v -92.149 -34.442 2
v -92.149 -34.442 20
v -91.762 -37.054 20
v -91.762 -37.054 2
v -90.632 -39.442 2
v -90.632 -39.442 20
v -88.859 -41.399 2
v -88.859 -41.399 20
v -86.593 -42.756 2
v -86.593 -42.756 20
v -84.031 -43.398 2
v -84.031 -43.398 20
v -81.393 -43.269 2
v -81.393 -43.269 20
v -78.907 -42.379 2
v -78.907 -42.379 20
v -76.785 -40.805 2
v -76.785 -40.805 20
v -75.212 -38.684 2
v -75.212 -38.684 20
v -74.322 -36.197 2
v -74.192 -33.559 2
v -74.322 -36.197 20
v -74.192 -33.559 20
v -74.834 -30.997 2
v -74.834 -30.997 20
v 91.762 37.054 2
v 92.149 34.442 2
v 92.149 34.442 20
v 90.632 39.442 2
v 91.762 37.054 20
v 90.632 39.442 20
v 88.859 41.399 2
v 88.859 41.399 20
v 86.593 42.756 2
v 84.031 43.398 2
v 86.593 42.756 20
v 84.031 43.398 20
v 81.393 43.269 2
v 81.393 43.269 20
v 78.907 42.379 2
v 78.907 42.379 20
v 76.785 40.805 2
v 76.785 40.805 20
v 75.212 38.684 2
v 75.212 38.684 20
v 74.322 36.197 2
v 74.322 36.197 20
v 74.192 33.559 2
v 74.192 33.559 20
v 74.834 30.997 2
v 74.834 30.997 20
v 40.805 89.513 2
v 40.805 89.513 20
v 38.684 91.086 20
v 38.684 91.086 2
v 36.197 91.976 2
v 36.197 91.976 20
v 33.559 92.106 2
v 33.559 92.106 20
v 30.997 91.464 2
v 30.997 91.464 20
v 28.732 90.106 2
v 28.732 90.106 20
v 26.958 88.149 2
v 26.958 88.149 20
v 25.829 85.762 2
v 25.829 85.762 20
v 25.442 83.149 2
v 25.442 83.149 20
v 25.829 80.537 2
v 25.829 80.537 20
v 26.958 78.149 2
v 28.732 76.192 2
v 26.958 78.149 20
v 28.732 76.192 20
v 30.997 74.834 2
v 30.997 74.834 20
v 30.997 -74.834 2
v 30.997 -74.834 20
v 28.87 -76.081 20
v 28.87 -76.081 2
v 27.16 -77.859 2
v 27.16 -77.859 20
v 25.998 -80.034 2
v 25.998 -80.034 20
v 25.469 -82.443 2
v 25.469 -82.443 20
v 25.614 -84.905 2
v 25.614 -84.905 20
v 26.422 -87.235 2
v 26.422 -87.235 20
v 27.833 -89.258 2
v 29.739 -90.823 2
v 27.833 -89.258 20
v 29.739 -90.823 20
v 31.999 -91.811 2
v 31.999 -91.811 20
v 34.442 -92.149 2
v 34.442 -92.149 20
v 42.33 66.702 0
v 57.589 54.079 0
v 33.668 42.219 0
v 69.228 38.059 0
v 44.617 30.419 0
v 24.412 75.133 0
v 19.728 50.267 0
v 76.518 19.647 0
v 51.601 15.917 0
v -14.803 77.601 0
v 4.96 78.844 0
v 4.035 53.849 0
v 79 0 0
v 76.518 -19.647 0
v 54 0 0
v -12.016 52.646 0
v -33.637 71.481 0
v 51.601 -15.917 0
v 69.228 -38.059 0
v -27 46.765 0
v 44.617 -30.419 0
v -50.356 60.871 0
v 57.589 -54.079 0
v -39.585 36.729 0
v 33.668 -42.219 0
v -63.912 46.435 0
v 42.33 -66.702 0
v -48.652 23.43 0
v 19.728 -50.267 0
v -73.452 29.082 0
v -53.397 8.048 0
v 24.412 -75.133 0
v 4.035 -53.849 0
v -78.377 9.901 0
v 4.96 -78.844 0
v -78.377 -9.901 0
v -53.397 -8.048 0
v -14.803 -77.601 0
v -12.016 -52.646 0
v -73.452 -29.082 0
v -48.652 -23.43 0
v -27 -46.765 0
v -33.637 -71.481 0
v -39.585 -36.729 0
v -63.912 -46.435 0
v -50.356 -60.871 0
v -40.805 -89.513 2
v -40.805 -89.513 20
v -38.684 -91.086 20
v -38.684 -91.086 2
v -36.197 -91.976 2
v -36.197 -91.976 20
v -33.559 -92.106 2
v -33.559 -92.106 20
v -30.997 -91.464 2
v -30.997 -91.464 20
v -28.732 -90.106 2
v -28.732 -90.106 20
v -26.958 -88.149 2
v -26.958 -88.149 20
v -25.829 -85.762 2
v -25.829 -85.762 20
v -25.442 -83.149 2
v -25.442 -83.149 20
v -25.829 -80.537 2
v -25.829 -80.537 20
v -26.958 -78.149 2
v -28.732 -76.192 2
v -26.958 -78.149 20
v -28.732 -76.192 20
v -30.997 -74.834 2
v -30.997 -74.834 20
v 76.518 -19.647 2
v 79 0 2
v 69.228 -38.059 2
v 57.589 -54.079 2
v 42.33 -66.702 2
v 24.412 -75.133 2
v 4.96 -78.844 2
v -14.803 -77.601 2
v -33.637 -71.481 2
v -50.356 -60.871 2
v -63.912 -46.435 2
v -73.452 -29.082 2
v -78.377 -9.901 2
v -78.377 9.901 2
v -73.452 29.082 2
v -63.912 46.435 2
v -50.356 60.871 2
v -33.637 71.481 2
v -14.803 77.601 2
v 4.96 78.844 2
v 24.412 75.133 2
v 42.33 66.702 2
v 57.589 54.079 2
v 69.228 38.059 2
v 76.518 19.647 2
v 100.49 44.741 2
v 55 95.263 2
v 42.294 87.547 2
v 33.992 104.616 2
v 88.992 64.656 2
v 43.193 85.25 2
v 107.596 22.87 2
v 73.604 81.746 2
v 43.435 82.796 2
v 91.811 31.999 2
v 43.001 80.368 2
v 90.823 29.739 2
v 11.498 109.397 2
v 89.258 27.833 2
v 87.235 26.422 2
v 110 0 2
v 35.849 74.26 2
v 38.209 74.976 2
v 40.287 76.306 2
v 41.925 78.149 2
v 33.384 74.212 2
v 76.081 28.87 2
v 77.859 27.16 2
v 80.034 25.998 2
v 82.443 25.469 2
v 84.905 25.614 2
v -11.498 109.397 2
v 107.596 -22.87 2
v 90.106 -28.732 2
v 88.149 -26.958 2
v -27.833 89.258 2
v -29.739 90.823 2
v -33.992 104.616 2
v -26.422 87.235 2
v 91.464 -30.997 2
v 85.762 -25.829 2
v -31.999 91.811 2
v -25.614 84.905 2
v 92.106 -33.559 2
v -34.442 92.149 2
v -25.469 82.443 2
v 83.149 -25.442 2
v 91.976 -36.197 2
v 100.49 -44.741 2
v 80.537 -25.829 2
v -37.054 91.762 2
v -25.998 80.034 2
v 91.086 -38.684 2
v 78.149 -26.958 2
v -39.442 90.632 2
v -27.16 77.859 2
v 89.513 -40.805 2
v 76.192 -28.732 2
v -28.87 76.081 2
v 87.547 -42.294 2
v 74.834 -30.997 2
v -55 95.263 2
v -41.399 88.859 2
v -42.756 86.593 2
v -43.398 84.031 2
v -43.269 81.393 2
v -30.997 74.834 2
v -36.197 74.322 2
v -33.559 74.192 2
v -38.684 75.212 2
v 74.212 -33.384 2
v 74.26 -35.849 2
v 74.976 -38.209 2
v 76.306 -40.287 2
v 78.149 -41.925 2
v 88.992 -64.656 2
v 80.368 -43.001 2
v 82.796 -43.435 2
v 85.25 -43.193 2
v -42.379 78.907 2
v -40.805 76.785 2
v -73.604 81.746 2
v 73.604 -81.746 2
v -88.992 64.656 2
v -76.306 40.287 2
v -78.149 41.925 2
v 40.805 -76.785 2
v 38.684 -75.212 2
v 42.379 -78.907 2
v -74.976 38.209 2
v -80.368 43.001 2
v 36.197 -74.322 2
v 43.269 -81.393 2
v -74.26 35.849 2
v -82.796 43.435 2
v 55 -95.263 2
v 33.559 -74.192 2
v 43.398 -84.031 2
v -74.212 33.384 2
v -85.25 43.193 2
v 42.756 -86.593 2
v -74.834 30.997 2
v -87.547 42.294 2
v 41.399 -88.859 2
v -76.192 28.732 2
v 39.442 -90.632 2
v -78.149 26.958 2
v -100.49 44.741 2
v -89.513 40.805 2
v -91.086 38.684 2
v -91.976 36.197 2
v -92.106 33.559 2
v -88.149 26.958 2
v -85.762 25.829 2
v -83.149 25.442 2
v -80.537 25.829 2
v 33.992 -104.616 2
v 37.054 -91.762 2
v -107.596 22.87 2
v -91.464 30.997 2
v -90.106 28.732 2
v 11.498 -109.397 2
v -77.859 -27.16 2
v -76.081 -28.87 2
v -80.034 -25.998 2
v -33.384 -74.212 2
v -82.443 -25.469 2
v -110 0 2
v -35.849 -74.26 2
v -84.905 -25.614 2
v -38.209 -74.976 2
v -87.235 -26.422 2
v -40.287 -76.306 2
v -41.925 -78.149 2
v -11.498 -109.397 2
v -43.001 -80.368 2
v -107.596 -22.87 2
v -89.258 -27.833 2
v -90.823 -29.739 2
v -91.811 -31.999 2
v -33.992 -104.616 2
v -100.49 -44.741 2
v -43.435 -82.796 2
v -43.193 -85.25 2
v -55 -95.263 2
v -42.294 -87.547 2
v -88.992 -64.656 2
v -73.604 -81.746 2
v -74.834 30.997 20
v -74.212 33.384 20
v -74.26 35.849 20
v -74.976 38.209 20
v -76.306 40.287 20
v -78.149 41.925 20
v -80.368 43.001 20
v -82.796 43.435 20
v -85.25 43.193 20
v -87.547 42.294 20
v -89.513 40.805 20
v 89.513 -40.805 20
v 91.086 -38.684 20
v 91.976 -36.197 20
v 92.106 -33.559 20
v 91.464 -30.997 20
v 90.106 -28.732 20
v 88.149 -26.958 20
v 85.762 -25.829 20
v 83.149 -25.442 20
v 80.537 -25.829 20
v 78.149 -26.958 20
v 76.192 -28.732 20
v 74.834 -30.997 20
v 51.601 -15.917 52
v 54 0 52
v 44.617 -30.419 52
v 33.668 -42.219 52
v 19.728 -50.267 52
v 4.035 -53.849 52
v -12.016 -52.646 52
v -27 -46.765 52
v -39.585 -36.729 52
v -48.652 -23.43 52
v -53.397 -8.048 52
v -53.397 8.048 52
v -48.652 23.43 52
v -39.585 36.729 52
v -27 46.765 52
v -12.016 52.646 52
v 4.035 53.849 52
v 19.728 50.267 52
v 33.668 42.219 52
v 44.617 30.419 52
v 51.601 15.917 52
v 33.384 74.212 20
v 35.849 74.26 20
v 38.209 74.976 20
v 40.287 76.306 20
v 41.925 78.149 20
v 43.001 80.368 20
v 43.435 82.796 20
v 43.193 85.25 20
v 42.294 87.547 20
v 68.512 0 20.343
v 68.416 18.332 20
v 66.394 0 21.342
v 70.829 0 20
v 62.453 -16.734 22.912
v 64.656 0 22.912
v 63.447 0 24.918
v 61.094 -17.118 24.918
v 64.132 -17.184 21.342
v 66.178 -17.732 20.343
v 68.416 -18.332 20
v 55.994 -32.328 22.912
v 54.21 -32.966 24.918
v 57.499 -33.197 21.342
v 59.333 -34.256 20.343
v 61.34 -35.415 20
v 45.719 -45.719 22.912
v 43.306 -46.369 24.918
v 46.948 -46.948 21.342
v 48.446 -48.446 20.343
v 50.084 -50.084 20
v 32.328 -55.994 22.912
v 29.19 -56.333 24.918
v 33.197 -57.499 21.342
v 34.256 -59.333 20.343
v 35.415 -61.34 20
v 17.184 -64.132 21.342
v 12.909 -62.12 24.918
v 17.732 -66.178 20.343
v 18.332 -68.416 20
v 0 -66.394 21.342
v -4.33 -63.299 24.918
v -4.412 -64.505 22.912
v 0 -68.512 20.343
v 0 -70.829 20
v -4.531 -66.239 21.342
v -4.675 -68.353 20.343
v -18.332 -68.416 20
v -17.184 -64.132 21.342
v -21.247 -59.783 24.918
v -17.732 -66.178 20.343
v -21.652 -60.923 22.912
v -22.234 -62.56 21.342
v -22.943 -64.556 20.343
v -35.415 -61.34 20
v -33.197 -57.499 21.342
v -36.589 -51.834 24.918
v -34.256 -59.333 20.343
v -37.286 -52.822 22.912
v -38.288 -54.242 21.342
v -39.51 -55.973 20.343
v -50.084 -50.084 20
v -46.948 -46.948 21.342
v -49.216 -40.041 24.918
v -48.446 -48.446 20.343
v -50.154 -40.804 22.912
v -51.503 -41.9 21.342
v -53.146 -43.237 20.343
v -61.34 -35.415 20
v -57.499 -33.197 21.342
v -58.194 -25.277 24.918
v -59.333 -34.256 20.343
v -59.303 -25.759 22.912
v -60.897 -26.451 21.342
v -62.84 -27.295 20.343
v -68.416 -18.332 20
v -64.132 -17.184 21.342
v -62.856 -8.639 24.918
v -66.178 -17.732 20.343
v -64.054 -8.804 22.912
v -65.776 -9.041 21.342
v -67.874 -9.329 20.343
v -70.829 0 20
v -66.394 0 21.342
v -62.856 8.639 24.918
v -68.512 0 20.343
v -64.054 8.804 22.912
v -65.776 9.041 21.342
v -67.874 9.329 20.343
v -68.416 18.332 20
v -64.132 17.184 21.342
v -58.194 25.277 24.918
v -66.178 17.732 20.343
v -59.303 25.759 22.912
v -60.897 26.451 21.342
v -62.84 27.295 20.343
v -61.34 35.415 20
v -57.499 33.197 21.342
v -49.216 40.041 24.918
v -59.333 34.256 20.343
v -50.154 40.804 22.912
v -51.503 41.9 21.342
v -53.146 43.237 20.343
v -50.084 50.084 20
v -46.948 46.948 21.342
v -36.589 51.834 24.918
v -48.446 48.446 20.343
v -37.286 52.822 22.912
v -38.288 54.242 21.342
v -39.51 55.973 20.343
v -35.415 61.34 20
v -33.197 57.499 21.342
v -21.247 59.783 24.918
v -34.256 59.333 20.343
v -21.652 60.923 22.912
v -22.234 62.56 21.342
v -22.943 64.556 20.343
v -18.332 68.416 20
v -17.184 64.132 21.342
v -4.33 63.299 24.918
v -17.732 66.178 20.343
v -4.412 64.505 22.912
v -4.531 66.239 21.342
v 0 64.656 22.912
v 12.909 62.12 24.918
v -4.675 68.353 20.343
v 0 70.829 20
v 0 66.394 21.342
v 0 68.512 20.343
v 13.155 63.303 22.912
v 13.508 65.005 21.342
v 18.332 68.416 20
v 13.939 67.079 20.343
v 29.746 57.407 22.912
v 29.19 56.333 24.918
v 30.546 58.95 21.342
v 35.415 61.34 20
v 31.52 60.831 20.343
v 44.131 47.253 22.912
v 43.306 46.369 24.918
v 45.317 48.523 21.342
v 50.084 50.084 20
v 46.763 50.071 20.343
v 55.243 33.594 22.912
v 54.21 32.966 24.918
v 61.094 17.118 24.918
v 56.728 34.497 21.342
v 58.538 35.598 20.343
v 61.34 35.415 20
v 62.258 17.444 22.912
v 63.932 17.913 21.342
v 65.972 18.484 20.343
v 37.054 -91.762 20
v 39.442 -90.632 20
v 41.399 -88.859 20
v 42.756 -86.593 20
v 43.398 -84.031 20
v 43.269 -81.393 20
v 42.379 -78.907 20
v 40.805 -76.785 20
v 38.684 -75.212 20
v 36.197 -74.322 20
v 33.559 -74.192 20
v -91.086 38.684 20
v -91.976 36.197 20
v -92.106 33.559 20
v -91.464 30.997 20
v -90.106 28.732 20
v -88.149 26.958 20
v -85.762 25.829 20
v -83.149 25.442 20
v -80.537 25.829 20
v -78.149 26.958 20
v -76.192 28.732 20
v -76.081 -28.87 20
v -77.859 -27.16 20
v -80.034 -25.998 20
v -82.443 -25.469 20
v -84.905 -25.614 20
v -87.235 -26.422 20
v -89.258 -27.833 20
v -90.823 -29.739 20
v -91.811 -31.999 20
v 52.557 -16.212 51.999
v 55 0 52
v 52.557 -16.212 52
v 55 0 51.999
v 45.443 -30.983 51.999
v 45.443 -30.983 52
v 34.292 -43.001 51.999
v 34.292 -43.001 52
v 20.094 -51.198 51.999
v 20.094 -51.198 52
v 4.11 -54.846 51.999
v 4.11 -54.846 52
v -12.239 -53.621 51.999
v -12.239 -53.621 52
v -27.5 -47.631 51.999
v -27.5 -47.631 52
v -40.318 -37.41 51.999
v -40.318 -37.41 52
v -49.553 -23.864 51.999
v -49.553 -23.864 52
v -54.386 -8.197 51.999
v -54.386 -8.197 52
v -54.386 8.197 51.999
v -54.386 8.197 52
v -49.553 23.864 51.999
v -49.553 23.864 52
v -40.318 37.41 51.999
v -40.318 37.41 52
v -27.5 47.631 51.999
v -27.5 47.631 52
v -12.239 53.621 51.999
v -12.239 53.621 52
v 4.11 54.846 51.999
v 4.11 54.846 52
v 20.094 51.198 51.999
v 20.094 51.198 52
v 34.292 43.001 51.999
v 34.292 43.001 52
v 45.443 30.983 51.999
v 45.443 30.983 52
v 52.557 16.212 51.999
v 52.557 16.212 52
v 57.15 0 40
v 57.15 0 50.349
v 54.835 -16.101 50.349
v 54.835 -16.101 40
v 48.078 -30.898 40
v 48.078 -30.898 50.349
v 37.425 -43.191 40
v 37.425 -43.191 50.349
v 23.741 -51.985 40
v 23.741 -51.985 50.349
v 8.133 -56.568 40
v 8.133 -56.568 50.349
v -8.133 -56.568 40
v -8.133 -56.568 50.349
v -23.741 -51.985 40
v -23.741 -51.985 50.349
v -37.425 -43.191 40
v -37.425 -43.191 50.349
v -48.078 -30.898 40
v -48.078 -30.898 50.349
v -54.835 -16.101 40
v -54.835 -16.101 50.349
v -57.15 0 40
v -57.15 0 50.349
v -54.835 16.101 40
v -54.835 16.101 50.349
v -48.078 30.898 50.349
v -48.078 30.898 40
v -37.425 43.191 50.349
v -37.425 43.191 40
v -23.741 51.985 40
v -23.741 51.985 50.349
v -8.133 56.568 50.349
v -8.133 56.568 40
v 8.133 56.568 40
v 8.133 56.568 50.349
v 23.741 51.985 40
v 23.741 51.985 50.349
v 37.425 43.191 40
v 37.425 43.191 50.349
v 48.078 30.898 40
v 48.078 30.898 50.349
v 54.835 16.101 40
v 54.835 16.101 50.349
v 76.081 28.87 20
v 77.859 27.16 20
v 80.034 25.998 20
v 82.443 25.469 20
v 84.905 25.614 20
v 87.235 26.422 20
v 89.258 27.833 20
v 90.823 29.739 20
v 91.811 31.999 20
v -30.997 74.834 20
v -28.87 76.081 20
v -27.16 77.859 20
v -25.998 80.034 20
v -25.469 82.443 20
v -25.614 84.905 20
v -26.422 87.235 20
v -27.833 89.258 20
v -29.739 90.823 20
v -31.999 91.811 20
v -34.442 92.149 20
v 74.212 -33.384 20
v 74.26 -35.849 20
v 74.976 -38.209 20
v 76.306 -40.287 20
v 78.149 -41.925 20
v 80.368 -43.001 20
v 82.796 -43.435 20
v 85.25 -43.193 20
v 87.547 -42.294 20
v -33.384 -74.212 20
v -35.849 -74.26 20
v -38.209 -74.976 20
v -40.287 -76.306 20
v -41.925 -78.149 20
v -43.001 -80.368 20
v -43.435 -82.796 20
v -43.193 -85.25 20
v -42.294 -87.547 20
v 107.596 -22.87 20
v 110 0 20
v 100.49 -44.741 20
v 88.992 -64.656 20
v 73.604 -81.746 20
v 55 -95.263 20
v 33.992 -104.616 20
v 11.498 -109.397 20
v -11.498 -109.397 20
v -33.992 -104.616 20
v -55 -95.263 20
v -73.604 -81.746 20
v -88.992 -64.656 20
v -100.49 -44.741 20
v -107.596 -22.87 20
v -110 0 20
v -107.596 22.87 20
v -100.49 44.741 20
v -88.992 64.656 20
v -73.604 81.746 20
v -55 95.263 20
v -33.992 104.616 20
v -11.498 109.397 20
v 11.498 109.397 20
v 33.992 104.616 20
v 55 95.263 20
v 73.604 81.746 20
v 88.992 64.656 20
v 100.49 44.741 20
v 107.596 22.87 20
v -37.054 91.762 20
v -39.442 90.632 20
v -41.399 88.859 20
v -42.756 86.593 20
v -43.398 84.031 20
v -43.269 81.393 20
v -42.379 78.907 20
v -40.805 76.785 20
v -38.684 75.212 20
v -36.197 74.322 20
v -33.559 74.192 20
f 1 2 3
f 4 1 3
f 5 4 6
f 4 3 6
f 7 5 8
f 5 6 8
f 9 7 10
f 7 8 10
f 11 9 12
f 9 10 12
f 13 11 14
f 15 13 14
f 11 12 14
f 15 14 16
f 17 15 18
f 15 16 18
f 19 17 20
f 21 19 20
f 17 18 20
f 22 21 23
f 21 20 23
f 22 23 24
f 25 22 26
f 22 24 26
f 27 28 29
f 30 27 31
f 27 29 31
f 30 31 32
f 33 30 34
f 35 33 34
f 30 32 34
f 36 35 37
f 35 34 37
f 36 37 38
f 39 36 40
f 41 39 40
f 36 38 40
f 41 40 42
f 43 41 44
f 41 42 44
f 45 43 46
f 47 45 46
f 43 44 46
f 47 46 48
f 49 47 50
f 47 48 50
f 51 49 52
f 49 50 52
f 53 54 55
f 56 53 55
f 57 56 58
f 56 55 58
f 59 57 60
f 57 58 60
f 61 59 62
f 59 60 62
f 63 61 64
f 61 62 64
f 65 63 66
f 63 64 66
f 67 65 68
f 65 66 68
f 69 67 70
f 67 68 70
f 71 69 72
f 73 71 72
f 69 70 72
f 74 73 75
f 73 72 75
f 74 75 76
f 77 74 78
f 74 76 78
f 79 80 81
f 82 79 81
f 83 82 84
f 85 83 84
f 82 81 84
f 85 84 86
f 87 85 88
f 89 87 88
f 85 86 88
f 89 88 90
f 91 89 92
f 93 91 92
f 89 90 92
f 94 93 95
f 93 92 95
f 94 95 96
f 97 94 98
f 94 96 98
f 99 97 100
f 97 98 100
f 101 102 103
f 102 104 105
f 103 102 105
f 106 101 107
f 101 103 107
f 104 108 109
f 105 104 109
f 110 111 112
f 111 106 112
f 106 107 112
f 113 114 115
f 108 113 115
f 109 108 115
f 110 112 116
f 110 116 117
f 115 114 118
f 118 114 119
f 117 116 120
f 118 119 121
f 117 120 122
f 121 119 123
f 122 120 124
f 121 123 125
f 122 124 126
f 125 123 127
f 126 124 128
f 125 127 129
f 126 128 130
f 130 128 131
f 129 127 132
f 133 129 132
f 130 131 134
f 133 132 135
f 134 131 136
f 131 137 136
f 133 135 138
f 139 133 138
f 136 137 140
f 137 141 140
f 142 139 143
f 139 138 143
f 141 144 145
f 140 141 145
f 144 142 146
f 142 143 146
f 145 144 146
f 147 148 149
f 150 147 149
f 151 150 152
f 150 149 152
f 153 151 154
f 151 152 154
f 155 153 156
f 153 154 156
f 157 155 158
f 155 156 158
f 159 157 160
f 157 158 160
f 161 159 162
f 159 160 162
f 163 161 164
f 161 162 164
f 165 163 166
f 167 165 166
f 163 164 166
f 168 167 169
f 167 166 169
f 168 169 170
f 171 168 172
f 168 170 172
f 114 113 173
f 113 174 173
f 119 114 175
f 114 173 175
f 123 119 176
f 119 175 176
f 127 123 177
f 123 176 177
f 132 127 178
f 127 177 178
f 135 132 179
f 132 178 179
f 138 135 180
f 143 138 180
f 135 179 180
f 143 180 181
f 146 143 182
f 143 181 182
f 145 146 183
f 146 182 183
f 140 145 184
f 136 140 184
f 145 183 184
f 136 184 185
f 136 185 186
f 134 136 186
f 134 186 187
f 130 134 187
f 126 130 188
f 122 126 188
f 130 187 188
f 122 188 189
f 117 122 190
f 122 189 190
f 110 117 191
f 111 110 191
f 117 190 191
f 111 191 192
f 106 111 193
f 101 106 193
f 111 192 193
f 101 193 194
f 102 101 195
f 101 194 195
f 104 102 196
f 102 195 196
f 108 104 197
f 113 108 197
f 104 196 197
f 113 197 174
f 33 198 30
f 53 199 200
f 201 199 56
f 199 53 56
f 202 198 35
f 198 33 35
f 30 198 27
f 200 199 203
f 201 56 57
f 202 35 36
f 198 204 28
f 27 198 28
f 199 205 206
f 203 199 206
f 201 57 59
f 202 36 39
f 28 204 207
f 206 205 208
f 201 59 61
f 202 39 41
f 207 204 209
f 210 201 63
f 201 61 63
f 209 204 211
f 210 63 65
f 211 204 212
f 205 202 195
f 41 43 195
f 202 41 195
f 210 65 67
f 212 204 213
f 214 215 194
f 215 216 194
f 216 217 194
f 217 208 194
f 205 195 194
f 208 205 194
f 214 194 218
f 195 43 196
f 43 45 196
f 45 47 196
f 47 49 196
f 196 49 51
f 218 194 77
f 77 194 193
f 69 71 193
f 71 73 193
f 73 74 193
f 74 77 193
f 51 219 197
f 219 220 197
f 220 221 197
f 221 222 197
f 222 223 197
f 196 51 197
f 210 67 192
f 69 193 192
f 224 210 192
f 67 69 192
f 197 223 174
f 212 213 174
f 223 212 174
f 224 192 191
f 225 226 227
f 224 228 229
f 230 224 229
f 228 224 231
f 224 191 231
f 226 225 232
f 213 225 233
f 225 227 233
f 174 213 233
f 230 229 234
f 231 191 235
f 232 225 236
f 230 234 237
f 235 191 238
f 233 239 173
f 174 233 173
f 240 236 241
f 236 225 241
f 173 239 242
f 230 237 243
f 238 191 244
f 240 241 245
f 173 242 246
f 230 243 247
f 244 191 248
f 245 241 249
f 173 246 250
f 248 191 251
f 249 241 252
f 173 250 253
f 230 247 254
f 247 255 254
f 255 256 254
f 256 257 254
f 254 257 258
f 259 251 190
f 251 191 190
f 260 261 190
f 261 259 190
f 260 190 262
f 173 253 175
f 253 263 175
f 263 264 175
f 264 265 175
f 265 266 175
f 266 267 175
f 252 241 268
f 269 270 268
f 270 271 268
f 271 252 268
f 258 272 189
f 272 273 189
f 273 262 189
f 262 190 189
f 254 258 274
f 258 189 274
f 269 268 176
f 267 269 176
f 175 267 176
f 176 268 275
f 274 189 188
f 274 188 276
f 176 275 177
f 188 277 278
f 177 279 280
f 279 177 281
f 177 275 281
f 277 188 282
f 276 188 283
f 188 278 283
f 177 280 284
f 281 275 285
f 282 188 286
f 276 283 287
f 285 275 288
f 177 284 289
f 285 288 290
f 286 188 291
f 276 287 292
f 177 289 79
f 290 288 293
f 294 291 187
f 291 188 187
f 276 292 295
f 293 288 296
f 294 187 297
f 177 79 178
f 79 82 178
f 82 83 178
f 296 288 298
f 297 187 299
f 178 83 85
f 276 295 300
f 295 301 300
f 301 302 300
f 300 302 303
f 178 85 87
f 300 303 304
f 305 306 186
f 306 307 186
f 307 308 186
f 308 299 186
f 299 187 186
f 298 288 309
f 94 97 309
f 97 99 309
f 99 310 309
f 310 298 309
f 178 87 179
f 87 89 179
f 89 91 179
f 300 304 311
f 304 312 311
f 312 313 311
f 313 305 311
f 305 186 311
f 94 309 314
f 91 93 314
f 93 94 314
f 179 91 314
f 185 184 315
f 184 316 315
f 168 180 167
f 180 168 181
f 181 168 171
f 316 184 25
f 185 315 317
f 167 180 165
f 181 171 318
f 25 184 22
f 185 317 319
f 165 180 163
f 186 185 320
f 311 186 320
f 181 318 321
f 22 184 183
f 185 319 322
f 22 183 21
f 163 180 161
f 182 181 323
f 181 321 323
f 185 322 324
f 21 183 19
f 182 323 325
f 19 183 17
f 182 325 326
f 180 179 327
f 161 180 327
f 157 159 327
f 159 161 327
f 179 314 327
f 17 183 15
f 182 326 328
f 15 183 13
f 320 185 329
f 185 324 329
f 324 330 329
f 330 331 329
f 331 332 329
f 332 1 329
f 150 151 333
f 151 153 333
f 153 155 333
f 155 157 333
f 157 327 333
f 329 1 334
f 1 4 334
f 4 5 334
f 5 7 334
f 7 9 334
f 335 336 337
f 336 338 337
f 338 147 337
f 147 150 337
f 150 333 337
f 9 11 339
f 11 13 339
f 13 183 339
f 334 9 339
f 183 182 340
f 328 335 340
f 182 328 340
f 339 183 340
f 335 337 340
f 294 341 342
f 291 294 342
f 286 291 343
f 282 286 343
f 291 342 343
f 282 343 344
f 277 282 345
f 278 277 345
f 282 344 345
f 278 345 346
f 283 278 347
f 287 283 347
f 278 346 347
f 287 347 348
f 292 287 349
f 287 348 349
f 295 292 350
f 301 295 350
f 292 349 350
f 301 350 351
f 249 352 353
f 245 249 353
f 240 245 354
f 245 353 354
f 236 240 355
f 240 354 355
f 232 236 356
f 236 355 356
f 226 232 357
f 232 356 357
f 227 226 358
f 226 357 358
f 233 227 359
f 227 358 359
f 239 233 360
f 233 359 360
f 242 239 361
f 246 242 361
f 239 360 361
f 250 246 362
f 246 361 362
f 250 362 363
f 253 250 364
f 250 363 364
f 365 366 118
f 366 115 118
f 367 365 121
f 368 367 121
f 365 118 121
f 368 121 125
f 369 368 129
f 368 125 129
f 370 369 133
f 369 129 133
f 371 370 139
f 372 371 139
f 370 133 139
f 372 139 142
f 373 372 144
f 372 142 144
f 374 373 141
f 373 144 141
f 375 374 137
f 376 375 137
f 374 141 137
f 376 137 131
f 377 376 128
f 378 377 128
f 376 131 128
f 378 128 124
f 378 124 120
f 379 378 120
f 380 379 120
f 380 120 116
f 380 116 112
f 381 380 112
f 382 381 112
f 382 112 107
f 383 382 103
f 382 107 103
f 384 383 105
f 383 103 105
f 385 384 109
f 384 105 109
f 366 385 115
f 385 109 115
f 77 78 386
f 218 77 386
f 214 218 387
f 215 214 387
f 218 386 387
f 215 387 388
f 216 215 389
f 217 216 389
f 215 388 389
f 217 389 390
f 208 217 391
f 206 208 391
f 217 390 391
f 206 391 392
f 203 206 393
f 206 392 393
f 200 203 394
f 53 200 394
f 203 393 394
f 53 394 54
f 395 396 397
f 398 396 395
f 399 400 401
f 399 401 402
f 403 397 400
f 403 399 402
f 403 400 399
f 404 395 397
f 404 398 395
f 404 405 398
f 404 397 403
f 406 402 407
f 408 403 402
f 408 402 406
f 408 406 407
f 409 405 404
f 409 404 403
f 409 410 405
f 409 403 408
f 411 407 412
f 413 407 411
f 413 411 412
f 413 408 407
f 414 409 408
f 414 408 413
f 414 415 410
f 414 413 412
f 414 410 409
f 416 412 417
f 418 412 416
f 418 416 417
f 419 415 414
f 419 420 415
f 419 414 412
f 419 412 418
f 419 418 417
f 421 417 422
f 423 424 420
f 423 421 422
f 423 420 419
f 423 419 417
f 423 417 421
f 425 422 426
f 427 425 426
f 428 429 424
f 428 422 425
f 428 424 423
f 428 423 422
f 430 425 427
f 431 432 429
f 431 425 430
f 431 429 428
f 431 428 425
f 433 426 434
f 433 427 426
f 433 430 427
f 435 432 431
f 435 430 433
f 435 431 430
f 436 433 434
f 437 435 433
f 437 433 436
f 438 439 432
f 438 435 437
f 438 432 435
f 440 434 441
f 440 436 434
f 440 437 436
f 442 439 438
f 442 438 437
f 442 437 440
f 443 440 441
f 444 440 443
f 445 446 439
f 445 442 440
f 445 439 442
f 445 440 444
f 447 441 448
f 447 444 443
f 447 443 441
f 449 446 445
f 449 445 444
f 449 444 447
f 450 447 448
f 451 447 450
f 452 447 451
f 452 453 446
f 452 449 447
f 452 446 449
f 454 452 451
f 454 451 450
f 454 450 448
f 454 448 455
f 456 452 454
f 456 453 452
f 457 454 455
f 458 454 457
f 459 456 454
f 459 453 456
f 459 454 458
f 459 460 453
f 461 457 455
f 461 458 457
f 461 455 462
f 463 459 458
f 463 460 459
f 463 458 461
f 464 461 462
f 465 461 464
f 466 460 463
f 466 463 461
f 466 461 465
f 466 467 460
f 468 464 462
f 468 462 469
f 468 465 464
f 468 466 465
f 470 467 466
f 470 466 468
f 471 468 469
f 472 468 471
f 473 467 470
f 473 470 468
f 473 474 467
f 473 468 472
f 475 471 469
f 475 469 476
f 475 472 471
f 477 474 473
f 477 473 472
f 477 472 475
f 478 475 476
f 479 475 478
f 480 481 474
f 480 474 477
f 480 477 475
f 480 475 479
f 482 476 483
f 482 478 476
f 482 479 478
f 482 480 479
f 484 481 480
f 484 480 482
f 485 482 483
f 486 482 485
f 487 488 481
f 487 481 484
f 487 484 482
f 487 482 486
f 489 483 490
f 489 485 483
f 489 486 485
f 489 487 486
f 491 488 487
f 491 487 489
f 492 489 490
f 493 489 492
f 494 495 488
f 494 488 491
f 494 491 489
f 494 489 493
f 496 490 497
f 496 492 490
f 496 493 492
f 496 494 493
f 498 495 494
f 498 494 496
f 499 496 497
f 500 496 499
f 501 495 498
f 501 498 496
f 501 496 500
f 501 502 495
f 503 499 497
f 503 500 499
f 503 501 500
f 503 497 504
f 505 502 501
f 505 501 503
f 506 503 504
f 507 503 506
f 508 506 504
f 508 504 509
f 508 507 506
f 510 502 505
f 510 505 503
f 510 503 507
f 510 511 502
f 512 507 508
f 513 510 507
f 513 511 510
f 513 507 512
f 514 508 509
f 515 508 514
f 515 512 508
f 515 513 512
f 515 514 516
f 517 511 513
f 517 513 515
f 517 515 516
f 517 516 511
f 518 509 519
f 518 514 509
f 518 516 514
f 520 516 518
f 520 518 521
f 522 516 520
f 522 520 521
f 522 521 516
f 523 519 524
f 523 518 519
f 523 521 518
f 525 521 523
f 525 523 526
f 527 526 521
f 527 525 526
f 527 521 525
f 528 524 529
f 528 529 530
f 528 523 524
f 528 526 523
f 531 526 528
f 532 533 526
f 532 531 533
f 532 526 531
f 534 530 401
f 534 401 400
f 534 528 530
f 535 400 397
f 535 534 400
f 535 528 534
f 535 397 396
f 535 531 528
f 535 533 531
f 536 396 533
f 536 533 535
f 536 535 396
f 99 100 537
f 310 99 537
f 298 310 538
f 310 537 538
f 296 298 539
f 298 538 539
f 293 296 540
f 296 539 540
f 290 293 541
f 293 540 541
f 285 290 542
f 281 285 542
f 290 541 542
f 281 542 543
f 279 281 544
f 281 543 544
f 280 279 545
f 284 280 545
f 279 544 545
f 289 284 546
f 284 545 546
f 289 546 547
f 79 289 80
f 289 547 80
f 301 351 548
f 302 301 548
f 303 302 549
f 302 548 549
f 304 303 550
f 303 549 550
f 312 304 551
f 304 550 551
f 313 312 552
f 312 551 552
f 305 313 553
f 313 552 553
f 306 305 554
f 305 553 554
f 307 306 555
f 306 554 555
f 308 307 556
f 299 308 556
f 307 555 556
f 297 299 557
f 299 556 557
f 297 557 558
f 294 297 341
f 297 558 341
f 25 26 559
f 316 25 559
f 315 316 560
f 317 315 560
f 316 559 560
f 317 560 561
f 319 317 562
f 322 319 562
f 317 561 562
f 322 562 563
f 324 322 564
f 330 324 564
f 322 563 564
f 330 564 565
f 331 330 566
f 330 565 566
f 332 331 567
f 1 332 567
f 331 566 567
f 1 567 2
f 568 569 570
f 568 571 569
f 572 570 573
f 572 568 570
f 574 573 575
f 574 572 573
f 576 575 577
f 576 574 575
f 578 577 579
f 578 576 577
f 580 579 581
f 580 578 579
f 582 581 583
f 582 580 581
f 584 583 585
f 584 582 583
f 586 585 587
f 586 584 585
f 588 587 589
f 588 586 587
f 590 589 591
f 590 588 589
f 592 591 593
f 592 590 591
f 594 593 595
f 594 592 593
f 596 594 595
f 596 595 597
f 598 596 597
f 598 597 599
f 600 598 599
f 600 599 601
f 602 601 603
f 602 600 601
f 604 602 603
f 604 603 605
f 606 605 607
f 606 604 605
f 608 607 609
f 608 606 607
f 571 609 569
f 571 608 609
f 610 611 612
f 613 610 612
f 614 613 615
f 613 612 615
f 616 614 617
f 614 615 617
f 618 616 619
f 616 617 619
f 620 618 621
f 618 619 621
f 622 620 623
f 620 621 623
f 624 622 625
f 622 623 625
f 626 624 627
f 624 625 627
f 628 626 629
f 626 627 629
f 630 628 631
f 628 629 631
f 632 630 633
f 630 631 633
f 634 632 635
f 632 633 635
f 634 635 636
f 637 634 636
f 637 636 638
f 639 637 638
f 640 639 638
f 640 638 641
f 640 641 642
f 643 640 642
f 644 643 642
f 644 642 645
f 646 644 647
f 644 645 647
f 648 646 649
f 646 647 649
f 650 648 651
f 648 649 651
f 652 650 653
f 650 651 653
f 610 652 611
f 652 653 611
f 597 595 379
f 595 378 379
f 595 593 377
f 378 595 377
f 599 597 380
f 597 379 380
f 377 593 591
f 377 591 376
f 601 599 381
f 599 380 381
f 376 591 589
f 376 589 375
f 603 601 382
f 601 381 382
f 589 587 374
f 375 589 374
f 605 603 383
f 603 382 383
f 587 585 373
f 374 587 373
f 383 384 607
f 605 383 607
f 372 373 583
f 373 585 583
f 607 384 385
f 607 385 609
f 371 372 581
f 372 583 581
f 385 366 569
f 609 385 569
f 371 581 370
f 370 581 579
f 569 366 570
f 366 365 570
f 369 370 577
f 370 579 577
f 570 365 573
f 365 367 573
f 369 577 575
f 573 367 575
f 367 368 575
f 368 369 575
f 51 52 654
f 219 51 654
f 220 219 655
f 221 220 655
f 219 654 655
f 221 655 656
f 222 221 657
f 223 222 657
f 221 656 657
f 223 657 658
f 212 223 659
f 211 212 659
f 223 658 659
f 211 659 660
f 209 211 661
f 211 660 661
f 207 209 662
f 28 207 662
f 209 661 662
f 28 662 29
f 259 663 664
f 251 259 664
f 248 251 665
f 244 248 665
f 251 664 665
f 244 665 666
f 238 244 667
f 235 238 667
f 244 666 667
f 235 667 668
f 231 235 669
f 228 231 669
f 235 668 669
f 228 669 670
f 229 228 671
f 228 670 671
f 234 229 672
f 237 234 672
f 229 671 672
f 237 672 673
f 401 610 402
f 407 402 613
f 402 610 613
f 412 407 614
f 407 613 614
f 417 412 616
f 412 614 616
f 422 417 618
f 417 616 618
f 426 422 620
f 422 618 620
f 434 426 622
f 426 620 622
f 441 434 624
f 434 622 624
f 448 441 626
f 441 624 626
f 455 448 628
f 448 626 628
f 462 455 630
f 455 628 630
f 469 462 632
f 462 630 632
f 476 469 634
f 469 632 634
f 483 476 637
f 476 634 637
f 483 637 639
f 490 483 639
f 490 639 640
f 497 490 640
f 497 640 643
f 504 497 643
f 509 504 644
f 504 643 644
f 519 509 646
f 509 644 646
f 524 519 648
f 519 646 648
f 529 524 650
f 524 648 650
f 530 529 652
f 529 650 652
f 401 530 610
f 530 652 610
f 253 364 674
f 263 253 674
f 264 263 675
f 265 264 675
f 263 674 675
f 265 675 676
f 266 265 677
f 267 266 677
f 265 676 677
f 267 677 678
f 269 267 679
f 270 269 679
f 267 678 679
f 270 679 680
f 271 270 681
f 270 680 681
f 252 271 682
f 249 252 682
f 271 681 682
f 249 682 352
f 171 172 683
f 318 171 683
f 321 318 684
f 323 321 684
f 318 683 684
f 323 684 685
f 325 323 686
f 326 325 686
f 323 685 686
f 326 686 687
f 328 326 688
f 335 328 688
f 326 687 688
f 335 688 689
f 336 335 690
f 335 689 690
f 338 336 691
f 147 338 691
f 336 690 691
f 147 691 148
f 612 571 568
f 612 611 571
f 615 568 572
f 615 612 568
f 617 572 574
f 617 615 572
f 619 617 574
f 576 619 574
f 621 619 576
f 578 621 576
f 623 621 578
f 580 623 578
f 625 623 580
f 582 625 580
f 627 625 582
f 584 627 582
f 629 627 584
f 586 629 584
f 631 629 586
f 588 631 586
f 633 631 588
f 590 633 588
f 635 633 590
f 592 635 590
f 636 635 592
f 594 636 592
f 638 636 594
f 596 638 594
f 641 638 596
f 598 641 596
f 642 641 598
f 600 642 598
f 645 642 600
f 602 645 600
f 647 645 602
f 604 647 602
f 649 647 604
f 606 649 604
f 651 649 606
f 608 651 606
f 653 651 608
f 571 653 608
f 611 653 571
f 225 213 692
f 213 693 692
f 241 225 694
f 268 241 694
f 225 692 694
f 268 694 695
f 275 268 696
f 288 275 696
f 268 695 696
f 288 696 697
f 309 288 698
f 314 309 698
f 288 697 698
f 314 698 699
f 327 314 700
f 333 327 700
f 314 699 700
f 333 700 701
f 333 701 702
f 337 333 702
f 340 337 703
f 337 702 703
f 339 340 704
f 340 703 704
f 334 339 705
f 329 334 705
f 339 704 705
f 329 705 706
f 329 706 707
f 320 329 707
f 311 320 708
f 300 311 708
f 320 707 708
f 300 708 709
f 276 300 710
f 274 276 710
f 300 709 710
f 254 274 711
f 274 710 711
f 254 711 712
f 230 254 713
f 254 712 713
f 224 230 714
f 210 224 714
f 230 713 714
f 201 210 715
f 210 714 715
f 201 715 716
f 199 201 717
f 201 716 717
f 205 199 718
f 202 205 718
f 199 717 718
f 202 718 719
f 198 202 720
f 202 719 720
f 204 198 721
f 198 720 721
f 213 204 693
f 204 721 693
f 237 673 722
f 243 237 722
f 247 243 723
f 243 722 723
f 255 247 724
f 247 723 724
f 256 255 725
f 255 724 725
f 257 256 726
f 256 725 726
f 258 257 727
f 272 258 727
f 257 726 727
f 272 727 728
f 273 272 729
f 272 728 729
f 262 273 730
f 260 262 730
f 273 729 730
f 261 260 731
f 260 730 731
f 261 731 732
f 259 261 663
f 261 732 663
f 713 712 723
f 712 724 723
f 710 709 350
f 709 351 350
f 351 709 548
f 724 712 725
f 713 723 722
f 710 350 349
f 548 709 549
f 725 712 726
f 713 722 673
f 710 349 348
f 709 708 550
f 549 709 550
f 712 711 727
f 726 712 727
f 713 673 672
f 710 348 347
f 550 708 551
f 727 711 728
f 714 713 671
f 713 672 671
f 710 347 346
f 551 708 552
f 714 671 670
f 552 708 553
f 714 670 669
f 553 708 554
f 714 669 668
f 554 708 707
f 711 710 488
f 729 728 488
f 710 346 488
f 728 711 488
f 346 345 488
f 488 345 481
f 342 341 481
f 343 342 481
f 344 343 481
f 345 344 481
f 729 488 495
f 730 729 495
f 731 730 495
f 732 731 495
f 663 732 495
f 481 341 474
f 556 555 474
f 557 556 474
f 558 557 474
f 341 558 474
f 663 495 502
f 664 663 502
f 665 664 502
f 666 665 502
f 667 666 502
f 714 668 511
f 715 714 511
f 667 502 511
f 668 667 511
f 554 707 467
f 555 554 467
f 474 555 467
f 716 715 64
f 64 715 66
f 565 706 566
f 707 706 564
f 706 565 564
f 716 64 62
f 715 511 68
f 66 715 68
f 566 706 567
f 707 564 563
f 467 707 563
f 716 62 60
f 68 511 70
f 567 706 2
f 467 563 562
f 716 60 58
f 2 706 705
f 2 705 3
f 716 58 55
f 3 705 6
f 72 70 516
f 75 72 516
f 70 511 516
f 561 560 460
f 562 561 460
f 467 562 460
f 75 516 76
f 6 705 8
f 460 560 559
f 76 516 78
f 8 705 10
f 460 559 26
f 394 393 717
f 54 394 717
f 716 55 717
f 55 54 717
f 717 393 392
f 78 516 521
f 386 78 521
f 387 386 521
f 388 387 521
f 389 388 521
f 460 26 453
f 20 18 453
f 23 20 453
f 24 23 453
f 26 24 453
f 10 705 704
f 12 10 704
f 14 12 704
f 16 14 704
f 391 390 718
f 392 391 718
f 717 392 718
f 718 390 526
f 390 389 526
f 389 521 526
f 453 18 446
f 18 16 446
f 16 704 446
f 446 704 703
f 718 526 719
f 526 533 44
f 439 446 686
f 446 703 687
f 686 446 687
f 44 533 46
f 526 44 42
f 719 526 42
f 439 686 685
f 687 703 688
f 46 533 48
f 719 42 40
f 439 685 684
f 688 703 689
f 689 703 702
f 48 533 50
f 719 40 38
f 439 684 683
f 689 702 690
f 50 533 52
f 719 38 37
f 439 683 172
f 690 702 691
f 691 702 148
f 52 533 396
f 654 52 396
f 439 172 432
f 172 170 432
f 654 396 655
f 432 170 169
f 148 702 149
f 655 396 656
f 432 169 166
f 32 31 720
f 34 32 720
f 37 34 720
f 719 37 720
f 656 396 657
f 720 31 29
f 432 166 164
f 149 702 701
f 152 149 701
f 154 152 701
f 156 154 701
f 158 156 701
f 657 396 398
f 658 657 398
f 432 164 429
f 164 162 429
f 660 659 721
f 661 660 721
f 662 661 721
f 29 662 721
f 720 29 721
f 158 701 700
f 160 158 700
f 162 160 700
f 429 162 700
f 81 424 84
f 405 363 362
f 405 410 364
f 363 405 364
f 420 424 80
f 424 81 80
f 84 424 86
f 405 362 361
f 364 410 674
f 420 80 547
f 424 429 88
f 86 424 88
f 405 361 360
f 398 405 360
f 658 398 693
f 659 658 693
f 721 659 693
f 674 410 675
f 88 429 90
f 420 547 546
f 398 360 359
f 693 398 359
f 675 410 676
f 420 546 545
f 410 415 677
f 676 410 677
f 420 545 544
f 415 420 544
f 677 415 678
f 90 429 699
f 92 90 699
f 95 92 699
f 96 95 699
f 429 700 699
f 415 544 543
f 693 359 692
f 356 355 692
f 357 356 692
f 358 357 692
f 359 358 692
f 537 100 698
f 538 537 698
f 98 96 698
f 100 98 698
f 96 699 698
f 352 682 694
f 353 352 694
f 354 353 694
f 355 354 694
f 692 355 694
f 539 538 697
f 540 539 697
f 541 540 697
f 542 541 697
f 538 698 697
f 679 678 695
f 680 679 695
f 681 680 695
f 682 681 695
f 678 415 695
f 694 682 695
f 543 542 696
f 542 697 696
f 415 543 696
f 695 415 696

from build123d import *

# Parameters (mm, degrees)
F3_DEPTH        = 20.001
F3_COPIES_COUNT = 8
F6_R            = 8


# Not quite as in the source:
# - a pattern or mirror of a feature is missing from the dataset's text; its kind, count and spacing are read off the source's solid


with BuildPart() as f1:
    # F0 (on Front) → F1 (revolve)
    with BuildSketch(Plane.XZ):
        Polygon((54, 52), (54, 0), (79, 0), (79, 2), (110, 2), (110, 20), (65.5, 20), (57.15, 40), (57.15, 52), align=None)
    revolve(axis=Axis((0, 0, 26), (0, 0, -1)))

    # F2 (on face) → F3 (cut, through all)
    with BuildSketch(Plane.XY.offset(20)):
        with BuildLine():
            ThreePointArc((74.8342421334, 30.9973580216), (84.9049708242, 25.6144413892), (92.149157926, 34.4415089129))
            ThreePointArc((92.149157926, 34.4415089129), (81.3933450279, 43.2685764365), (74.8342421334, 30.9973580216))
        make_face()
    f3 = extrude(amount=-F3_DEPTH, mode=Mode.SUBTRACT)

    # F3_copies: F3 ×8 about axis
    f3_copies_axis = Axis((0, 0, 0), (0, 0, 1))
    for i in range(1, F3_COPIES_COUNT):
        add(f3.rotate(f3_copies_axis, i * 360 / F3_COPIES_COUNT), mode=Mode.SUBTRACT)

    # F4 (on Front) → F5 (revolve, cut)
    with BuildSketch(Plane.XZ):
        Polygon((57.15, 52), (55, 52), (55, 51.999), (57.15, 50.3492469758), align=None)
    revolve(axis=Axis((0, 0, 26), (0, 0, -1)), mode=Mode.SUBTRACT)

    # F6
    f6_edges = [f1.edges().sort_by_distance(p)[0] for p in [
        (-65.5, 0, 20),
    ]]
    fillet(f6_edges, radius=F6_R)


solid = f1.part
